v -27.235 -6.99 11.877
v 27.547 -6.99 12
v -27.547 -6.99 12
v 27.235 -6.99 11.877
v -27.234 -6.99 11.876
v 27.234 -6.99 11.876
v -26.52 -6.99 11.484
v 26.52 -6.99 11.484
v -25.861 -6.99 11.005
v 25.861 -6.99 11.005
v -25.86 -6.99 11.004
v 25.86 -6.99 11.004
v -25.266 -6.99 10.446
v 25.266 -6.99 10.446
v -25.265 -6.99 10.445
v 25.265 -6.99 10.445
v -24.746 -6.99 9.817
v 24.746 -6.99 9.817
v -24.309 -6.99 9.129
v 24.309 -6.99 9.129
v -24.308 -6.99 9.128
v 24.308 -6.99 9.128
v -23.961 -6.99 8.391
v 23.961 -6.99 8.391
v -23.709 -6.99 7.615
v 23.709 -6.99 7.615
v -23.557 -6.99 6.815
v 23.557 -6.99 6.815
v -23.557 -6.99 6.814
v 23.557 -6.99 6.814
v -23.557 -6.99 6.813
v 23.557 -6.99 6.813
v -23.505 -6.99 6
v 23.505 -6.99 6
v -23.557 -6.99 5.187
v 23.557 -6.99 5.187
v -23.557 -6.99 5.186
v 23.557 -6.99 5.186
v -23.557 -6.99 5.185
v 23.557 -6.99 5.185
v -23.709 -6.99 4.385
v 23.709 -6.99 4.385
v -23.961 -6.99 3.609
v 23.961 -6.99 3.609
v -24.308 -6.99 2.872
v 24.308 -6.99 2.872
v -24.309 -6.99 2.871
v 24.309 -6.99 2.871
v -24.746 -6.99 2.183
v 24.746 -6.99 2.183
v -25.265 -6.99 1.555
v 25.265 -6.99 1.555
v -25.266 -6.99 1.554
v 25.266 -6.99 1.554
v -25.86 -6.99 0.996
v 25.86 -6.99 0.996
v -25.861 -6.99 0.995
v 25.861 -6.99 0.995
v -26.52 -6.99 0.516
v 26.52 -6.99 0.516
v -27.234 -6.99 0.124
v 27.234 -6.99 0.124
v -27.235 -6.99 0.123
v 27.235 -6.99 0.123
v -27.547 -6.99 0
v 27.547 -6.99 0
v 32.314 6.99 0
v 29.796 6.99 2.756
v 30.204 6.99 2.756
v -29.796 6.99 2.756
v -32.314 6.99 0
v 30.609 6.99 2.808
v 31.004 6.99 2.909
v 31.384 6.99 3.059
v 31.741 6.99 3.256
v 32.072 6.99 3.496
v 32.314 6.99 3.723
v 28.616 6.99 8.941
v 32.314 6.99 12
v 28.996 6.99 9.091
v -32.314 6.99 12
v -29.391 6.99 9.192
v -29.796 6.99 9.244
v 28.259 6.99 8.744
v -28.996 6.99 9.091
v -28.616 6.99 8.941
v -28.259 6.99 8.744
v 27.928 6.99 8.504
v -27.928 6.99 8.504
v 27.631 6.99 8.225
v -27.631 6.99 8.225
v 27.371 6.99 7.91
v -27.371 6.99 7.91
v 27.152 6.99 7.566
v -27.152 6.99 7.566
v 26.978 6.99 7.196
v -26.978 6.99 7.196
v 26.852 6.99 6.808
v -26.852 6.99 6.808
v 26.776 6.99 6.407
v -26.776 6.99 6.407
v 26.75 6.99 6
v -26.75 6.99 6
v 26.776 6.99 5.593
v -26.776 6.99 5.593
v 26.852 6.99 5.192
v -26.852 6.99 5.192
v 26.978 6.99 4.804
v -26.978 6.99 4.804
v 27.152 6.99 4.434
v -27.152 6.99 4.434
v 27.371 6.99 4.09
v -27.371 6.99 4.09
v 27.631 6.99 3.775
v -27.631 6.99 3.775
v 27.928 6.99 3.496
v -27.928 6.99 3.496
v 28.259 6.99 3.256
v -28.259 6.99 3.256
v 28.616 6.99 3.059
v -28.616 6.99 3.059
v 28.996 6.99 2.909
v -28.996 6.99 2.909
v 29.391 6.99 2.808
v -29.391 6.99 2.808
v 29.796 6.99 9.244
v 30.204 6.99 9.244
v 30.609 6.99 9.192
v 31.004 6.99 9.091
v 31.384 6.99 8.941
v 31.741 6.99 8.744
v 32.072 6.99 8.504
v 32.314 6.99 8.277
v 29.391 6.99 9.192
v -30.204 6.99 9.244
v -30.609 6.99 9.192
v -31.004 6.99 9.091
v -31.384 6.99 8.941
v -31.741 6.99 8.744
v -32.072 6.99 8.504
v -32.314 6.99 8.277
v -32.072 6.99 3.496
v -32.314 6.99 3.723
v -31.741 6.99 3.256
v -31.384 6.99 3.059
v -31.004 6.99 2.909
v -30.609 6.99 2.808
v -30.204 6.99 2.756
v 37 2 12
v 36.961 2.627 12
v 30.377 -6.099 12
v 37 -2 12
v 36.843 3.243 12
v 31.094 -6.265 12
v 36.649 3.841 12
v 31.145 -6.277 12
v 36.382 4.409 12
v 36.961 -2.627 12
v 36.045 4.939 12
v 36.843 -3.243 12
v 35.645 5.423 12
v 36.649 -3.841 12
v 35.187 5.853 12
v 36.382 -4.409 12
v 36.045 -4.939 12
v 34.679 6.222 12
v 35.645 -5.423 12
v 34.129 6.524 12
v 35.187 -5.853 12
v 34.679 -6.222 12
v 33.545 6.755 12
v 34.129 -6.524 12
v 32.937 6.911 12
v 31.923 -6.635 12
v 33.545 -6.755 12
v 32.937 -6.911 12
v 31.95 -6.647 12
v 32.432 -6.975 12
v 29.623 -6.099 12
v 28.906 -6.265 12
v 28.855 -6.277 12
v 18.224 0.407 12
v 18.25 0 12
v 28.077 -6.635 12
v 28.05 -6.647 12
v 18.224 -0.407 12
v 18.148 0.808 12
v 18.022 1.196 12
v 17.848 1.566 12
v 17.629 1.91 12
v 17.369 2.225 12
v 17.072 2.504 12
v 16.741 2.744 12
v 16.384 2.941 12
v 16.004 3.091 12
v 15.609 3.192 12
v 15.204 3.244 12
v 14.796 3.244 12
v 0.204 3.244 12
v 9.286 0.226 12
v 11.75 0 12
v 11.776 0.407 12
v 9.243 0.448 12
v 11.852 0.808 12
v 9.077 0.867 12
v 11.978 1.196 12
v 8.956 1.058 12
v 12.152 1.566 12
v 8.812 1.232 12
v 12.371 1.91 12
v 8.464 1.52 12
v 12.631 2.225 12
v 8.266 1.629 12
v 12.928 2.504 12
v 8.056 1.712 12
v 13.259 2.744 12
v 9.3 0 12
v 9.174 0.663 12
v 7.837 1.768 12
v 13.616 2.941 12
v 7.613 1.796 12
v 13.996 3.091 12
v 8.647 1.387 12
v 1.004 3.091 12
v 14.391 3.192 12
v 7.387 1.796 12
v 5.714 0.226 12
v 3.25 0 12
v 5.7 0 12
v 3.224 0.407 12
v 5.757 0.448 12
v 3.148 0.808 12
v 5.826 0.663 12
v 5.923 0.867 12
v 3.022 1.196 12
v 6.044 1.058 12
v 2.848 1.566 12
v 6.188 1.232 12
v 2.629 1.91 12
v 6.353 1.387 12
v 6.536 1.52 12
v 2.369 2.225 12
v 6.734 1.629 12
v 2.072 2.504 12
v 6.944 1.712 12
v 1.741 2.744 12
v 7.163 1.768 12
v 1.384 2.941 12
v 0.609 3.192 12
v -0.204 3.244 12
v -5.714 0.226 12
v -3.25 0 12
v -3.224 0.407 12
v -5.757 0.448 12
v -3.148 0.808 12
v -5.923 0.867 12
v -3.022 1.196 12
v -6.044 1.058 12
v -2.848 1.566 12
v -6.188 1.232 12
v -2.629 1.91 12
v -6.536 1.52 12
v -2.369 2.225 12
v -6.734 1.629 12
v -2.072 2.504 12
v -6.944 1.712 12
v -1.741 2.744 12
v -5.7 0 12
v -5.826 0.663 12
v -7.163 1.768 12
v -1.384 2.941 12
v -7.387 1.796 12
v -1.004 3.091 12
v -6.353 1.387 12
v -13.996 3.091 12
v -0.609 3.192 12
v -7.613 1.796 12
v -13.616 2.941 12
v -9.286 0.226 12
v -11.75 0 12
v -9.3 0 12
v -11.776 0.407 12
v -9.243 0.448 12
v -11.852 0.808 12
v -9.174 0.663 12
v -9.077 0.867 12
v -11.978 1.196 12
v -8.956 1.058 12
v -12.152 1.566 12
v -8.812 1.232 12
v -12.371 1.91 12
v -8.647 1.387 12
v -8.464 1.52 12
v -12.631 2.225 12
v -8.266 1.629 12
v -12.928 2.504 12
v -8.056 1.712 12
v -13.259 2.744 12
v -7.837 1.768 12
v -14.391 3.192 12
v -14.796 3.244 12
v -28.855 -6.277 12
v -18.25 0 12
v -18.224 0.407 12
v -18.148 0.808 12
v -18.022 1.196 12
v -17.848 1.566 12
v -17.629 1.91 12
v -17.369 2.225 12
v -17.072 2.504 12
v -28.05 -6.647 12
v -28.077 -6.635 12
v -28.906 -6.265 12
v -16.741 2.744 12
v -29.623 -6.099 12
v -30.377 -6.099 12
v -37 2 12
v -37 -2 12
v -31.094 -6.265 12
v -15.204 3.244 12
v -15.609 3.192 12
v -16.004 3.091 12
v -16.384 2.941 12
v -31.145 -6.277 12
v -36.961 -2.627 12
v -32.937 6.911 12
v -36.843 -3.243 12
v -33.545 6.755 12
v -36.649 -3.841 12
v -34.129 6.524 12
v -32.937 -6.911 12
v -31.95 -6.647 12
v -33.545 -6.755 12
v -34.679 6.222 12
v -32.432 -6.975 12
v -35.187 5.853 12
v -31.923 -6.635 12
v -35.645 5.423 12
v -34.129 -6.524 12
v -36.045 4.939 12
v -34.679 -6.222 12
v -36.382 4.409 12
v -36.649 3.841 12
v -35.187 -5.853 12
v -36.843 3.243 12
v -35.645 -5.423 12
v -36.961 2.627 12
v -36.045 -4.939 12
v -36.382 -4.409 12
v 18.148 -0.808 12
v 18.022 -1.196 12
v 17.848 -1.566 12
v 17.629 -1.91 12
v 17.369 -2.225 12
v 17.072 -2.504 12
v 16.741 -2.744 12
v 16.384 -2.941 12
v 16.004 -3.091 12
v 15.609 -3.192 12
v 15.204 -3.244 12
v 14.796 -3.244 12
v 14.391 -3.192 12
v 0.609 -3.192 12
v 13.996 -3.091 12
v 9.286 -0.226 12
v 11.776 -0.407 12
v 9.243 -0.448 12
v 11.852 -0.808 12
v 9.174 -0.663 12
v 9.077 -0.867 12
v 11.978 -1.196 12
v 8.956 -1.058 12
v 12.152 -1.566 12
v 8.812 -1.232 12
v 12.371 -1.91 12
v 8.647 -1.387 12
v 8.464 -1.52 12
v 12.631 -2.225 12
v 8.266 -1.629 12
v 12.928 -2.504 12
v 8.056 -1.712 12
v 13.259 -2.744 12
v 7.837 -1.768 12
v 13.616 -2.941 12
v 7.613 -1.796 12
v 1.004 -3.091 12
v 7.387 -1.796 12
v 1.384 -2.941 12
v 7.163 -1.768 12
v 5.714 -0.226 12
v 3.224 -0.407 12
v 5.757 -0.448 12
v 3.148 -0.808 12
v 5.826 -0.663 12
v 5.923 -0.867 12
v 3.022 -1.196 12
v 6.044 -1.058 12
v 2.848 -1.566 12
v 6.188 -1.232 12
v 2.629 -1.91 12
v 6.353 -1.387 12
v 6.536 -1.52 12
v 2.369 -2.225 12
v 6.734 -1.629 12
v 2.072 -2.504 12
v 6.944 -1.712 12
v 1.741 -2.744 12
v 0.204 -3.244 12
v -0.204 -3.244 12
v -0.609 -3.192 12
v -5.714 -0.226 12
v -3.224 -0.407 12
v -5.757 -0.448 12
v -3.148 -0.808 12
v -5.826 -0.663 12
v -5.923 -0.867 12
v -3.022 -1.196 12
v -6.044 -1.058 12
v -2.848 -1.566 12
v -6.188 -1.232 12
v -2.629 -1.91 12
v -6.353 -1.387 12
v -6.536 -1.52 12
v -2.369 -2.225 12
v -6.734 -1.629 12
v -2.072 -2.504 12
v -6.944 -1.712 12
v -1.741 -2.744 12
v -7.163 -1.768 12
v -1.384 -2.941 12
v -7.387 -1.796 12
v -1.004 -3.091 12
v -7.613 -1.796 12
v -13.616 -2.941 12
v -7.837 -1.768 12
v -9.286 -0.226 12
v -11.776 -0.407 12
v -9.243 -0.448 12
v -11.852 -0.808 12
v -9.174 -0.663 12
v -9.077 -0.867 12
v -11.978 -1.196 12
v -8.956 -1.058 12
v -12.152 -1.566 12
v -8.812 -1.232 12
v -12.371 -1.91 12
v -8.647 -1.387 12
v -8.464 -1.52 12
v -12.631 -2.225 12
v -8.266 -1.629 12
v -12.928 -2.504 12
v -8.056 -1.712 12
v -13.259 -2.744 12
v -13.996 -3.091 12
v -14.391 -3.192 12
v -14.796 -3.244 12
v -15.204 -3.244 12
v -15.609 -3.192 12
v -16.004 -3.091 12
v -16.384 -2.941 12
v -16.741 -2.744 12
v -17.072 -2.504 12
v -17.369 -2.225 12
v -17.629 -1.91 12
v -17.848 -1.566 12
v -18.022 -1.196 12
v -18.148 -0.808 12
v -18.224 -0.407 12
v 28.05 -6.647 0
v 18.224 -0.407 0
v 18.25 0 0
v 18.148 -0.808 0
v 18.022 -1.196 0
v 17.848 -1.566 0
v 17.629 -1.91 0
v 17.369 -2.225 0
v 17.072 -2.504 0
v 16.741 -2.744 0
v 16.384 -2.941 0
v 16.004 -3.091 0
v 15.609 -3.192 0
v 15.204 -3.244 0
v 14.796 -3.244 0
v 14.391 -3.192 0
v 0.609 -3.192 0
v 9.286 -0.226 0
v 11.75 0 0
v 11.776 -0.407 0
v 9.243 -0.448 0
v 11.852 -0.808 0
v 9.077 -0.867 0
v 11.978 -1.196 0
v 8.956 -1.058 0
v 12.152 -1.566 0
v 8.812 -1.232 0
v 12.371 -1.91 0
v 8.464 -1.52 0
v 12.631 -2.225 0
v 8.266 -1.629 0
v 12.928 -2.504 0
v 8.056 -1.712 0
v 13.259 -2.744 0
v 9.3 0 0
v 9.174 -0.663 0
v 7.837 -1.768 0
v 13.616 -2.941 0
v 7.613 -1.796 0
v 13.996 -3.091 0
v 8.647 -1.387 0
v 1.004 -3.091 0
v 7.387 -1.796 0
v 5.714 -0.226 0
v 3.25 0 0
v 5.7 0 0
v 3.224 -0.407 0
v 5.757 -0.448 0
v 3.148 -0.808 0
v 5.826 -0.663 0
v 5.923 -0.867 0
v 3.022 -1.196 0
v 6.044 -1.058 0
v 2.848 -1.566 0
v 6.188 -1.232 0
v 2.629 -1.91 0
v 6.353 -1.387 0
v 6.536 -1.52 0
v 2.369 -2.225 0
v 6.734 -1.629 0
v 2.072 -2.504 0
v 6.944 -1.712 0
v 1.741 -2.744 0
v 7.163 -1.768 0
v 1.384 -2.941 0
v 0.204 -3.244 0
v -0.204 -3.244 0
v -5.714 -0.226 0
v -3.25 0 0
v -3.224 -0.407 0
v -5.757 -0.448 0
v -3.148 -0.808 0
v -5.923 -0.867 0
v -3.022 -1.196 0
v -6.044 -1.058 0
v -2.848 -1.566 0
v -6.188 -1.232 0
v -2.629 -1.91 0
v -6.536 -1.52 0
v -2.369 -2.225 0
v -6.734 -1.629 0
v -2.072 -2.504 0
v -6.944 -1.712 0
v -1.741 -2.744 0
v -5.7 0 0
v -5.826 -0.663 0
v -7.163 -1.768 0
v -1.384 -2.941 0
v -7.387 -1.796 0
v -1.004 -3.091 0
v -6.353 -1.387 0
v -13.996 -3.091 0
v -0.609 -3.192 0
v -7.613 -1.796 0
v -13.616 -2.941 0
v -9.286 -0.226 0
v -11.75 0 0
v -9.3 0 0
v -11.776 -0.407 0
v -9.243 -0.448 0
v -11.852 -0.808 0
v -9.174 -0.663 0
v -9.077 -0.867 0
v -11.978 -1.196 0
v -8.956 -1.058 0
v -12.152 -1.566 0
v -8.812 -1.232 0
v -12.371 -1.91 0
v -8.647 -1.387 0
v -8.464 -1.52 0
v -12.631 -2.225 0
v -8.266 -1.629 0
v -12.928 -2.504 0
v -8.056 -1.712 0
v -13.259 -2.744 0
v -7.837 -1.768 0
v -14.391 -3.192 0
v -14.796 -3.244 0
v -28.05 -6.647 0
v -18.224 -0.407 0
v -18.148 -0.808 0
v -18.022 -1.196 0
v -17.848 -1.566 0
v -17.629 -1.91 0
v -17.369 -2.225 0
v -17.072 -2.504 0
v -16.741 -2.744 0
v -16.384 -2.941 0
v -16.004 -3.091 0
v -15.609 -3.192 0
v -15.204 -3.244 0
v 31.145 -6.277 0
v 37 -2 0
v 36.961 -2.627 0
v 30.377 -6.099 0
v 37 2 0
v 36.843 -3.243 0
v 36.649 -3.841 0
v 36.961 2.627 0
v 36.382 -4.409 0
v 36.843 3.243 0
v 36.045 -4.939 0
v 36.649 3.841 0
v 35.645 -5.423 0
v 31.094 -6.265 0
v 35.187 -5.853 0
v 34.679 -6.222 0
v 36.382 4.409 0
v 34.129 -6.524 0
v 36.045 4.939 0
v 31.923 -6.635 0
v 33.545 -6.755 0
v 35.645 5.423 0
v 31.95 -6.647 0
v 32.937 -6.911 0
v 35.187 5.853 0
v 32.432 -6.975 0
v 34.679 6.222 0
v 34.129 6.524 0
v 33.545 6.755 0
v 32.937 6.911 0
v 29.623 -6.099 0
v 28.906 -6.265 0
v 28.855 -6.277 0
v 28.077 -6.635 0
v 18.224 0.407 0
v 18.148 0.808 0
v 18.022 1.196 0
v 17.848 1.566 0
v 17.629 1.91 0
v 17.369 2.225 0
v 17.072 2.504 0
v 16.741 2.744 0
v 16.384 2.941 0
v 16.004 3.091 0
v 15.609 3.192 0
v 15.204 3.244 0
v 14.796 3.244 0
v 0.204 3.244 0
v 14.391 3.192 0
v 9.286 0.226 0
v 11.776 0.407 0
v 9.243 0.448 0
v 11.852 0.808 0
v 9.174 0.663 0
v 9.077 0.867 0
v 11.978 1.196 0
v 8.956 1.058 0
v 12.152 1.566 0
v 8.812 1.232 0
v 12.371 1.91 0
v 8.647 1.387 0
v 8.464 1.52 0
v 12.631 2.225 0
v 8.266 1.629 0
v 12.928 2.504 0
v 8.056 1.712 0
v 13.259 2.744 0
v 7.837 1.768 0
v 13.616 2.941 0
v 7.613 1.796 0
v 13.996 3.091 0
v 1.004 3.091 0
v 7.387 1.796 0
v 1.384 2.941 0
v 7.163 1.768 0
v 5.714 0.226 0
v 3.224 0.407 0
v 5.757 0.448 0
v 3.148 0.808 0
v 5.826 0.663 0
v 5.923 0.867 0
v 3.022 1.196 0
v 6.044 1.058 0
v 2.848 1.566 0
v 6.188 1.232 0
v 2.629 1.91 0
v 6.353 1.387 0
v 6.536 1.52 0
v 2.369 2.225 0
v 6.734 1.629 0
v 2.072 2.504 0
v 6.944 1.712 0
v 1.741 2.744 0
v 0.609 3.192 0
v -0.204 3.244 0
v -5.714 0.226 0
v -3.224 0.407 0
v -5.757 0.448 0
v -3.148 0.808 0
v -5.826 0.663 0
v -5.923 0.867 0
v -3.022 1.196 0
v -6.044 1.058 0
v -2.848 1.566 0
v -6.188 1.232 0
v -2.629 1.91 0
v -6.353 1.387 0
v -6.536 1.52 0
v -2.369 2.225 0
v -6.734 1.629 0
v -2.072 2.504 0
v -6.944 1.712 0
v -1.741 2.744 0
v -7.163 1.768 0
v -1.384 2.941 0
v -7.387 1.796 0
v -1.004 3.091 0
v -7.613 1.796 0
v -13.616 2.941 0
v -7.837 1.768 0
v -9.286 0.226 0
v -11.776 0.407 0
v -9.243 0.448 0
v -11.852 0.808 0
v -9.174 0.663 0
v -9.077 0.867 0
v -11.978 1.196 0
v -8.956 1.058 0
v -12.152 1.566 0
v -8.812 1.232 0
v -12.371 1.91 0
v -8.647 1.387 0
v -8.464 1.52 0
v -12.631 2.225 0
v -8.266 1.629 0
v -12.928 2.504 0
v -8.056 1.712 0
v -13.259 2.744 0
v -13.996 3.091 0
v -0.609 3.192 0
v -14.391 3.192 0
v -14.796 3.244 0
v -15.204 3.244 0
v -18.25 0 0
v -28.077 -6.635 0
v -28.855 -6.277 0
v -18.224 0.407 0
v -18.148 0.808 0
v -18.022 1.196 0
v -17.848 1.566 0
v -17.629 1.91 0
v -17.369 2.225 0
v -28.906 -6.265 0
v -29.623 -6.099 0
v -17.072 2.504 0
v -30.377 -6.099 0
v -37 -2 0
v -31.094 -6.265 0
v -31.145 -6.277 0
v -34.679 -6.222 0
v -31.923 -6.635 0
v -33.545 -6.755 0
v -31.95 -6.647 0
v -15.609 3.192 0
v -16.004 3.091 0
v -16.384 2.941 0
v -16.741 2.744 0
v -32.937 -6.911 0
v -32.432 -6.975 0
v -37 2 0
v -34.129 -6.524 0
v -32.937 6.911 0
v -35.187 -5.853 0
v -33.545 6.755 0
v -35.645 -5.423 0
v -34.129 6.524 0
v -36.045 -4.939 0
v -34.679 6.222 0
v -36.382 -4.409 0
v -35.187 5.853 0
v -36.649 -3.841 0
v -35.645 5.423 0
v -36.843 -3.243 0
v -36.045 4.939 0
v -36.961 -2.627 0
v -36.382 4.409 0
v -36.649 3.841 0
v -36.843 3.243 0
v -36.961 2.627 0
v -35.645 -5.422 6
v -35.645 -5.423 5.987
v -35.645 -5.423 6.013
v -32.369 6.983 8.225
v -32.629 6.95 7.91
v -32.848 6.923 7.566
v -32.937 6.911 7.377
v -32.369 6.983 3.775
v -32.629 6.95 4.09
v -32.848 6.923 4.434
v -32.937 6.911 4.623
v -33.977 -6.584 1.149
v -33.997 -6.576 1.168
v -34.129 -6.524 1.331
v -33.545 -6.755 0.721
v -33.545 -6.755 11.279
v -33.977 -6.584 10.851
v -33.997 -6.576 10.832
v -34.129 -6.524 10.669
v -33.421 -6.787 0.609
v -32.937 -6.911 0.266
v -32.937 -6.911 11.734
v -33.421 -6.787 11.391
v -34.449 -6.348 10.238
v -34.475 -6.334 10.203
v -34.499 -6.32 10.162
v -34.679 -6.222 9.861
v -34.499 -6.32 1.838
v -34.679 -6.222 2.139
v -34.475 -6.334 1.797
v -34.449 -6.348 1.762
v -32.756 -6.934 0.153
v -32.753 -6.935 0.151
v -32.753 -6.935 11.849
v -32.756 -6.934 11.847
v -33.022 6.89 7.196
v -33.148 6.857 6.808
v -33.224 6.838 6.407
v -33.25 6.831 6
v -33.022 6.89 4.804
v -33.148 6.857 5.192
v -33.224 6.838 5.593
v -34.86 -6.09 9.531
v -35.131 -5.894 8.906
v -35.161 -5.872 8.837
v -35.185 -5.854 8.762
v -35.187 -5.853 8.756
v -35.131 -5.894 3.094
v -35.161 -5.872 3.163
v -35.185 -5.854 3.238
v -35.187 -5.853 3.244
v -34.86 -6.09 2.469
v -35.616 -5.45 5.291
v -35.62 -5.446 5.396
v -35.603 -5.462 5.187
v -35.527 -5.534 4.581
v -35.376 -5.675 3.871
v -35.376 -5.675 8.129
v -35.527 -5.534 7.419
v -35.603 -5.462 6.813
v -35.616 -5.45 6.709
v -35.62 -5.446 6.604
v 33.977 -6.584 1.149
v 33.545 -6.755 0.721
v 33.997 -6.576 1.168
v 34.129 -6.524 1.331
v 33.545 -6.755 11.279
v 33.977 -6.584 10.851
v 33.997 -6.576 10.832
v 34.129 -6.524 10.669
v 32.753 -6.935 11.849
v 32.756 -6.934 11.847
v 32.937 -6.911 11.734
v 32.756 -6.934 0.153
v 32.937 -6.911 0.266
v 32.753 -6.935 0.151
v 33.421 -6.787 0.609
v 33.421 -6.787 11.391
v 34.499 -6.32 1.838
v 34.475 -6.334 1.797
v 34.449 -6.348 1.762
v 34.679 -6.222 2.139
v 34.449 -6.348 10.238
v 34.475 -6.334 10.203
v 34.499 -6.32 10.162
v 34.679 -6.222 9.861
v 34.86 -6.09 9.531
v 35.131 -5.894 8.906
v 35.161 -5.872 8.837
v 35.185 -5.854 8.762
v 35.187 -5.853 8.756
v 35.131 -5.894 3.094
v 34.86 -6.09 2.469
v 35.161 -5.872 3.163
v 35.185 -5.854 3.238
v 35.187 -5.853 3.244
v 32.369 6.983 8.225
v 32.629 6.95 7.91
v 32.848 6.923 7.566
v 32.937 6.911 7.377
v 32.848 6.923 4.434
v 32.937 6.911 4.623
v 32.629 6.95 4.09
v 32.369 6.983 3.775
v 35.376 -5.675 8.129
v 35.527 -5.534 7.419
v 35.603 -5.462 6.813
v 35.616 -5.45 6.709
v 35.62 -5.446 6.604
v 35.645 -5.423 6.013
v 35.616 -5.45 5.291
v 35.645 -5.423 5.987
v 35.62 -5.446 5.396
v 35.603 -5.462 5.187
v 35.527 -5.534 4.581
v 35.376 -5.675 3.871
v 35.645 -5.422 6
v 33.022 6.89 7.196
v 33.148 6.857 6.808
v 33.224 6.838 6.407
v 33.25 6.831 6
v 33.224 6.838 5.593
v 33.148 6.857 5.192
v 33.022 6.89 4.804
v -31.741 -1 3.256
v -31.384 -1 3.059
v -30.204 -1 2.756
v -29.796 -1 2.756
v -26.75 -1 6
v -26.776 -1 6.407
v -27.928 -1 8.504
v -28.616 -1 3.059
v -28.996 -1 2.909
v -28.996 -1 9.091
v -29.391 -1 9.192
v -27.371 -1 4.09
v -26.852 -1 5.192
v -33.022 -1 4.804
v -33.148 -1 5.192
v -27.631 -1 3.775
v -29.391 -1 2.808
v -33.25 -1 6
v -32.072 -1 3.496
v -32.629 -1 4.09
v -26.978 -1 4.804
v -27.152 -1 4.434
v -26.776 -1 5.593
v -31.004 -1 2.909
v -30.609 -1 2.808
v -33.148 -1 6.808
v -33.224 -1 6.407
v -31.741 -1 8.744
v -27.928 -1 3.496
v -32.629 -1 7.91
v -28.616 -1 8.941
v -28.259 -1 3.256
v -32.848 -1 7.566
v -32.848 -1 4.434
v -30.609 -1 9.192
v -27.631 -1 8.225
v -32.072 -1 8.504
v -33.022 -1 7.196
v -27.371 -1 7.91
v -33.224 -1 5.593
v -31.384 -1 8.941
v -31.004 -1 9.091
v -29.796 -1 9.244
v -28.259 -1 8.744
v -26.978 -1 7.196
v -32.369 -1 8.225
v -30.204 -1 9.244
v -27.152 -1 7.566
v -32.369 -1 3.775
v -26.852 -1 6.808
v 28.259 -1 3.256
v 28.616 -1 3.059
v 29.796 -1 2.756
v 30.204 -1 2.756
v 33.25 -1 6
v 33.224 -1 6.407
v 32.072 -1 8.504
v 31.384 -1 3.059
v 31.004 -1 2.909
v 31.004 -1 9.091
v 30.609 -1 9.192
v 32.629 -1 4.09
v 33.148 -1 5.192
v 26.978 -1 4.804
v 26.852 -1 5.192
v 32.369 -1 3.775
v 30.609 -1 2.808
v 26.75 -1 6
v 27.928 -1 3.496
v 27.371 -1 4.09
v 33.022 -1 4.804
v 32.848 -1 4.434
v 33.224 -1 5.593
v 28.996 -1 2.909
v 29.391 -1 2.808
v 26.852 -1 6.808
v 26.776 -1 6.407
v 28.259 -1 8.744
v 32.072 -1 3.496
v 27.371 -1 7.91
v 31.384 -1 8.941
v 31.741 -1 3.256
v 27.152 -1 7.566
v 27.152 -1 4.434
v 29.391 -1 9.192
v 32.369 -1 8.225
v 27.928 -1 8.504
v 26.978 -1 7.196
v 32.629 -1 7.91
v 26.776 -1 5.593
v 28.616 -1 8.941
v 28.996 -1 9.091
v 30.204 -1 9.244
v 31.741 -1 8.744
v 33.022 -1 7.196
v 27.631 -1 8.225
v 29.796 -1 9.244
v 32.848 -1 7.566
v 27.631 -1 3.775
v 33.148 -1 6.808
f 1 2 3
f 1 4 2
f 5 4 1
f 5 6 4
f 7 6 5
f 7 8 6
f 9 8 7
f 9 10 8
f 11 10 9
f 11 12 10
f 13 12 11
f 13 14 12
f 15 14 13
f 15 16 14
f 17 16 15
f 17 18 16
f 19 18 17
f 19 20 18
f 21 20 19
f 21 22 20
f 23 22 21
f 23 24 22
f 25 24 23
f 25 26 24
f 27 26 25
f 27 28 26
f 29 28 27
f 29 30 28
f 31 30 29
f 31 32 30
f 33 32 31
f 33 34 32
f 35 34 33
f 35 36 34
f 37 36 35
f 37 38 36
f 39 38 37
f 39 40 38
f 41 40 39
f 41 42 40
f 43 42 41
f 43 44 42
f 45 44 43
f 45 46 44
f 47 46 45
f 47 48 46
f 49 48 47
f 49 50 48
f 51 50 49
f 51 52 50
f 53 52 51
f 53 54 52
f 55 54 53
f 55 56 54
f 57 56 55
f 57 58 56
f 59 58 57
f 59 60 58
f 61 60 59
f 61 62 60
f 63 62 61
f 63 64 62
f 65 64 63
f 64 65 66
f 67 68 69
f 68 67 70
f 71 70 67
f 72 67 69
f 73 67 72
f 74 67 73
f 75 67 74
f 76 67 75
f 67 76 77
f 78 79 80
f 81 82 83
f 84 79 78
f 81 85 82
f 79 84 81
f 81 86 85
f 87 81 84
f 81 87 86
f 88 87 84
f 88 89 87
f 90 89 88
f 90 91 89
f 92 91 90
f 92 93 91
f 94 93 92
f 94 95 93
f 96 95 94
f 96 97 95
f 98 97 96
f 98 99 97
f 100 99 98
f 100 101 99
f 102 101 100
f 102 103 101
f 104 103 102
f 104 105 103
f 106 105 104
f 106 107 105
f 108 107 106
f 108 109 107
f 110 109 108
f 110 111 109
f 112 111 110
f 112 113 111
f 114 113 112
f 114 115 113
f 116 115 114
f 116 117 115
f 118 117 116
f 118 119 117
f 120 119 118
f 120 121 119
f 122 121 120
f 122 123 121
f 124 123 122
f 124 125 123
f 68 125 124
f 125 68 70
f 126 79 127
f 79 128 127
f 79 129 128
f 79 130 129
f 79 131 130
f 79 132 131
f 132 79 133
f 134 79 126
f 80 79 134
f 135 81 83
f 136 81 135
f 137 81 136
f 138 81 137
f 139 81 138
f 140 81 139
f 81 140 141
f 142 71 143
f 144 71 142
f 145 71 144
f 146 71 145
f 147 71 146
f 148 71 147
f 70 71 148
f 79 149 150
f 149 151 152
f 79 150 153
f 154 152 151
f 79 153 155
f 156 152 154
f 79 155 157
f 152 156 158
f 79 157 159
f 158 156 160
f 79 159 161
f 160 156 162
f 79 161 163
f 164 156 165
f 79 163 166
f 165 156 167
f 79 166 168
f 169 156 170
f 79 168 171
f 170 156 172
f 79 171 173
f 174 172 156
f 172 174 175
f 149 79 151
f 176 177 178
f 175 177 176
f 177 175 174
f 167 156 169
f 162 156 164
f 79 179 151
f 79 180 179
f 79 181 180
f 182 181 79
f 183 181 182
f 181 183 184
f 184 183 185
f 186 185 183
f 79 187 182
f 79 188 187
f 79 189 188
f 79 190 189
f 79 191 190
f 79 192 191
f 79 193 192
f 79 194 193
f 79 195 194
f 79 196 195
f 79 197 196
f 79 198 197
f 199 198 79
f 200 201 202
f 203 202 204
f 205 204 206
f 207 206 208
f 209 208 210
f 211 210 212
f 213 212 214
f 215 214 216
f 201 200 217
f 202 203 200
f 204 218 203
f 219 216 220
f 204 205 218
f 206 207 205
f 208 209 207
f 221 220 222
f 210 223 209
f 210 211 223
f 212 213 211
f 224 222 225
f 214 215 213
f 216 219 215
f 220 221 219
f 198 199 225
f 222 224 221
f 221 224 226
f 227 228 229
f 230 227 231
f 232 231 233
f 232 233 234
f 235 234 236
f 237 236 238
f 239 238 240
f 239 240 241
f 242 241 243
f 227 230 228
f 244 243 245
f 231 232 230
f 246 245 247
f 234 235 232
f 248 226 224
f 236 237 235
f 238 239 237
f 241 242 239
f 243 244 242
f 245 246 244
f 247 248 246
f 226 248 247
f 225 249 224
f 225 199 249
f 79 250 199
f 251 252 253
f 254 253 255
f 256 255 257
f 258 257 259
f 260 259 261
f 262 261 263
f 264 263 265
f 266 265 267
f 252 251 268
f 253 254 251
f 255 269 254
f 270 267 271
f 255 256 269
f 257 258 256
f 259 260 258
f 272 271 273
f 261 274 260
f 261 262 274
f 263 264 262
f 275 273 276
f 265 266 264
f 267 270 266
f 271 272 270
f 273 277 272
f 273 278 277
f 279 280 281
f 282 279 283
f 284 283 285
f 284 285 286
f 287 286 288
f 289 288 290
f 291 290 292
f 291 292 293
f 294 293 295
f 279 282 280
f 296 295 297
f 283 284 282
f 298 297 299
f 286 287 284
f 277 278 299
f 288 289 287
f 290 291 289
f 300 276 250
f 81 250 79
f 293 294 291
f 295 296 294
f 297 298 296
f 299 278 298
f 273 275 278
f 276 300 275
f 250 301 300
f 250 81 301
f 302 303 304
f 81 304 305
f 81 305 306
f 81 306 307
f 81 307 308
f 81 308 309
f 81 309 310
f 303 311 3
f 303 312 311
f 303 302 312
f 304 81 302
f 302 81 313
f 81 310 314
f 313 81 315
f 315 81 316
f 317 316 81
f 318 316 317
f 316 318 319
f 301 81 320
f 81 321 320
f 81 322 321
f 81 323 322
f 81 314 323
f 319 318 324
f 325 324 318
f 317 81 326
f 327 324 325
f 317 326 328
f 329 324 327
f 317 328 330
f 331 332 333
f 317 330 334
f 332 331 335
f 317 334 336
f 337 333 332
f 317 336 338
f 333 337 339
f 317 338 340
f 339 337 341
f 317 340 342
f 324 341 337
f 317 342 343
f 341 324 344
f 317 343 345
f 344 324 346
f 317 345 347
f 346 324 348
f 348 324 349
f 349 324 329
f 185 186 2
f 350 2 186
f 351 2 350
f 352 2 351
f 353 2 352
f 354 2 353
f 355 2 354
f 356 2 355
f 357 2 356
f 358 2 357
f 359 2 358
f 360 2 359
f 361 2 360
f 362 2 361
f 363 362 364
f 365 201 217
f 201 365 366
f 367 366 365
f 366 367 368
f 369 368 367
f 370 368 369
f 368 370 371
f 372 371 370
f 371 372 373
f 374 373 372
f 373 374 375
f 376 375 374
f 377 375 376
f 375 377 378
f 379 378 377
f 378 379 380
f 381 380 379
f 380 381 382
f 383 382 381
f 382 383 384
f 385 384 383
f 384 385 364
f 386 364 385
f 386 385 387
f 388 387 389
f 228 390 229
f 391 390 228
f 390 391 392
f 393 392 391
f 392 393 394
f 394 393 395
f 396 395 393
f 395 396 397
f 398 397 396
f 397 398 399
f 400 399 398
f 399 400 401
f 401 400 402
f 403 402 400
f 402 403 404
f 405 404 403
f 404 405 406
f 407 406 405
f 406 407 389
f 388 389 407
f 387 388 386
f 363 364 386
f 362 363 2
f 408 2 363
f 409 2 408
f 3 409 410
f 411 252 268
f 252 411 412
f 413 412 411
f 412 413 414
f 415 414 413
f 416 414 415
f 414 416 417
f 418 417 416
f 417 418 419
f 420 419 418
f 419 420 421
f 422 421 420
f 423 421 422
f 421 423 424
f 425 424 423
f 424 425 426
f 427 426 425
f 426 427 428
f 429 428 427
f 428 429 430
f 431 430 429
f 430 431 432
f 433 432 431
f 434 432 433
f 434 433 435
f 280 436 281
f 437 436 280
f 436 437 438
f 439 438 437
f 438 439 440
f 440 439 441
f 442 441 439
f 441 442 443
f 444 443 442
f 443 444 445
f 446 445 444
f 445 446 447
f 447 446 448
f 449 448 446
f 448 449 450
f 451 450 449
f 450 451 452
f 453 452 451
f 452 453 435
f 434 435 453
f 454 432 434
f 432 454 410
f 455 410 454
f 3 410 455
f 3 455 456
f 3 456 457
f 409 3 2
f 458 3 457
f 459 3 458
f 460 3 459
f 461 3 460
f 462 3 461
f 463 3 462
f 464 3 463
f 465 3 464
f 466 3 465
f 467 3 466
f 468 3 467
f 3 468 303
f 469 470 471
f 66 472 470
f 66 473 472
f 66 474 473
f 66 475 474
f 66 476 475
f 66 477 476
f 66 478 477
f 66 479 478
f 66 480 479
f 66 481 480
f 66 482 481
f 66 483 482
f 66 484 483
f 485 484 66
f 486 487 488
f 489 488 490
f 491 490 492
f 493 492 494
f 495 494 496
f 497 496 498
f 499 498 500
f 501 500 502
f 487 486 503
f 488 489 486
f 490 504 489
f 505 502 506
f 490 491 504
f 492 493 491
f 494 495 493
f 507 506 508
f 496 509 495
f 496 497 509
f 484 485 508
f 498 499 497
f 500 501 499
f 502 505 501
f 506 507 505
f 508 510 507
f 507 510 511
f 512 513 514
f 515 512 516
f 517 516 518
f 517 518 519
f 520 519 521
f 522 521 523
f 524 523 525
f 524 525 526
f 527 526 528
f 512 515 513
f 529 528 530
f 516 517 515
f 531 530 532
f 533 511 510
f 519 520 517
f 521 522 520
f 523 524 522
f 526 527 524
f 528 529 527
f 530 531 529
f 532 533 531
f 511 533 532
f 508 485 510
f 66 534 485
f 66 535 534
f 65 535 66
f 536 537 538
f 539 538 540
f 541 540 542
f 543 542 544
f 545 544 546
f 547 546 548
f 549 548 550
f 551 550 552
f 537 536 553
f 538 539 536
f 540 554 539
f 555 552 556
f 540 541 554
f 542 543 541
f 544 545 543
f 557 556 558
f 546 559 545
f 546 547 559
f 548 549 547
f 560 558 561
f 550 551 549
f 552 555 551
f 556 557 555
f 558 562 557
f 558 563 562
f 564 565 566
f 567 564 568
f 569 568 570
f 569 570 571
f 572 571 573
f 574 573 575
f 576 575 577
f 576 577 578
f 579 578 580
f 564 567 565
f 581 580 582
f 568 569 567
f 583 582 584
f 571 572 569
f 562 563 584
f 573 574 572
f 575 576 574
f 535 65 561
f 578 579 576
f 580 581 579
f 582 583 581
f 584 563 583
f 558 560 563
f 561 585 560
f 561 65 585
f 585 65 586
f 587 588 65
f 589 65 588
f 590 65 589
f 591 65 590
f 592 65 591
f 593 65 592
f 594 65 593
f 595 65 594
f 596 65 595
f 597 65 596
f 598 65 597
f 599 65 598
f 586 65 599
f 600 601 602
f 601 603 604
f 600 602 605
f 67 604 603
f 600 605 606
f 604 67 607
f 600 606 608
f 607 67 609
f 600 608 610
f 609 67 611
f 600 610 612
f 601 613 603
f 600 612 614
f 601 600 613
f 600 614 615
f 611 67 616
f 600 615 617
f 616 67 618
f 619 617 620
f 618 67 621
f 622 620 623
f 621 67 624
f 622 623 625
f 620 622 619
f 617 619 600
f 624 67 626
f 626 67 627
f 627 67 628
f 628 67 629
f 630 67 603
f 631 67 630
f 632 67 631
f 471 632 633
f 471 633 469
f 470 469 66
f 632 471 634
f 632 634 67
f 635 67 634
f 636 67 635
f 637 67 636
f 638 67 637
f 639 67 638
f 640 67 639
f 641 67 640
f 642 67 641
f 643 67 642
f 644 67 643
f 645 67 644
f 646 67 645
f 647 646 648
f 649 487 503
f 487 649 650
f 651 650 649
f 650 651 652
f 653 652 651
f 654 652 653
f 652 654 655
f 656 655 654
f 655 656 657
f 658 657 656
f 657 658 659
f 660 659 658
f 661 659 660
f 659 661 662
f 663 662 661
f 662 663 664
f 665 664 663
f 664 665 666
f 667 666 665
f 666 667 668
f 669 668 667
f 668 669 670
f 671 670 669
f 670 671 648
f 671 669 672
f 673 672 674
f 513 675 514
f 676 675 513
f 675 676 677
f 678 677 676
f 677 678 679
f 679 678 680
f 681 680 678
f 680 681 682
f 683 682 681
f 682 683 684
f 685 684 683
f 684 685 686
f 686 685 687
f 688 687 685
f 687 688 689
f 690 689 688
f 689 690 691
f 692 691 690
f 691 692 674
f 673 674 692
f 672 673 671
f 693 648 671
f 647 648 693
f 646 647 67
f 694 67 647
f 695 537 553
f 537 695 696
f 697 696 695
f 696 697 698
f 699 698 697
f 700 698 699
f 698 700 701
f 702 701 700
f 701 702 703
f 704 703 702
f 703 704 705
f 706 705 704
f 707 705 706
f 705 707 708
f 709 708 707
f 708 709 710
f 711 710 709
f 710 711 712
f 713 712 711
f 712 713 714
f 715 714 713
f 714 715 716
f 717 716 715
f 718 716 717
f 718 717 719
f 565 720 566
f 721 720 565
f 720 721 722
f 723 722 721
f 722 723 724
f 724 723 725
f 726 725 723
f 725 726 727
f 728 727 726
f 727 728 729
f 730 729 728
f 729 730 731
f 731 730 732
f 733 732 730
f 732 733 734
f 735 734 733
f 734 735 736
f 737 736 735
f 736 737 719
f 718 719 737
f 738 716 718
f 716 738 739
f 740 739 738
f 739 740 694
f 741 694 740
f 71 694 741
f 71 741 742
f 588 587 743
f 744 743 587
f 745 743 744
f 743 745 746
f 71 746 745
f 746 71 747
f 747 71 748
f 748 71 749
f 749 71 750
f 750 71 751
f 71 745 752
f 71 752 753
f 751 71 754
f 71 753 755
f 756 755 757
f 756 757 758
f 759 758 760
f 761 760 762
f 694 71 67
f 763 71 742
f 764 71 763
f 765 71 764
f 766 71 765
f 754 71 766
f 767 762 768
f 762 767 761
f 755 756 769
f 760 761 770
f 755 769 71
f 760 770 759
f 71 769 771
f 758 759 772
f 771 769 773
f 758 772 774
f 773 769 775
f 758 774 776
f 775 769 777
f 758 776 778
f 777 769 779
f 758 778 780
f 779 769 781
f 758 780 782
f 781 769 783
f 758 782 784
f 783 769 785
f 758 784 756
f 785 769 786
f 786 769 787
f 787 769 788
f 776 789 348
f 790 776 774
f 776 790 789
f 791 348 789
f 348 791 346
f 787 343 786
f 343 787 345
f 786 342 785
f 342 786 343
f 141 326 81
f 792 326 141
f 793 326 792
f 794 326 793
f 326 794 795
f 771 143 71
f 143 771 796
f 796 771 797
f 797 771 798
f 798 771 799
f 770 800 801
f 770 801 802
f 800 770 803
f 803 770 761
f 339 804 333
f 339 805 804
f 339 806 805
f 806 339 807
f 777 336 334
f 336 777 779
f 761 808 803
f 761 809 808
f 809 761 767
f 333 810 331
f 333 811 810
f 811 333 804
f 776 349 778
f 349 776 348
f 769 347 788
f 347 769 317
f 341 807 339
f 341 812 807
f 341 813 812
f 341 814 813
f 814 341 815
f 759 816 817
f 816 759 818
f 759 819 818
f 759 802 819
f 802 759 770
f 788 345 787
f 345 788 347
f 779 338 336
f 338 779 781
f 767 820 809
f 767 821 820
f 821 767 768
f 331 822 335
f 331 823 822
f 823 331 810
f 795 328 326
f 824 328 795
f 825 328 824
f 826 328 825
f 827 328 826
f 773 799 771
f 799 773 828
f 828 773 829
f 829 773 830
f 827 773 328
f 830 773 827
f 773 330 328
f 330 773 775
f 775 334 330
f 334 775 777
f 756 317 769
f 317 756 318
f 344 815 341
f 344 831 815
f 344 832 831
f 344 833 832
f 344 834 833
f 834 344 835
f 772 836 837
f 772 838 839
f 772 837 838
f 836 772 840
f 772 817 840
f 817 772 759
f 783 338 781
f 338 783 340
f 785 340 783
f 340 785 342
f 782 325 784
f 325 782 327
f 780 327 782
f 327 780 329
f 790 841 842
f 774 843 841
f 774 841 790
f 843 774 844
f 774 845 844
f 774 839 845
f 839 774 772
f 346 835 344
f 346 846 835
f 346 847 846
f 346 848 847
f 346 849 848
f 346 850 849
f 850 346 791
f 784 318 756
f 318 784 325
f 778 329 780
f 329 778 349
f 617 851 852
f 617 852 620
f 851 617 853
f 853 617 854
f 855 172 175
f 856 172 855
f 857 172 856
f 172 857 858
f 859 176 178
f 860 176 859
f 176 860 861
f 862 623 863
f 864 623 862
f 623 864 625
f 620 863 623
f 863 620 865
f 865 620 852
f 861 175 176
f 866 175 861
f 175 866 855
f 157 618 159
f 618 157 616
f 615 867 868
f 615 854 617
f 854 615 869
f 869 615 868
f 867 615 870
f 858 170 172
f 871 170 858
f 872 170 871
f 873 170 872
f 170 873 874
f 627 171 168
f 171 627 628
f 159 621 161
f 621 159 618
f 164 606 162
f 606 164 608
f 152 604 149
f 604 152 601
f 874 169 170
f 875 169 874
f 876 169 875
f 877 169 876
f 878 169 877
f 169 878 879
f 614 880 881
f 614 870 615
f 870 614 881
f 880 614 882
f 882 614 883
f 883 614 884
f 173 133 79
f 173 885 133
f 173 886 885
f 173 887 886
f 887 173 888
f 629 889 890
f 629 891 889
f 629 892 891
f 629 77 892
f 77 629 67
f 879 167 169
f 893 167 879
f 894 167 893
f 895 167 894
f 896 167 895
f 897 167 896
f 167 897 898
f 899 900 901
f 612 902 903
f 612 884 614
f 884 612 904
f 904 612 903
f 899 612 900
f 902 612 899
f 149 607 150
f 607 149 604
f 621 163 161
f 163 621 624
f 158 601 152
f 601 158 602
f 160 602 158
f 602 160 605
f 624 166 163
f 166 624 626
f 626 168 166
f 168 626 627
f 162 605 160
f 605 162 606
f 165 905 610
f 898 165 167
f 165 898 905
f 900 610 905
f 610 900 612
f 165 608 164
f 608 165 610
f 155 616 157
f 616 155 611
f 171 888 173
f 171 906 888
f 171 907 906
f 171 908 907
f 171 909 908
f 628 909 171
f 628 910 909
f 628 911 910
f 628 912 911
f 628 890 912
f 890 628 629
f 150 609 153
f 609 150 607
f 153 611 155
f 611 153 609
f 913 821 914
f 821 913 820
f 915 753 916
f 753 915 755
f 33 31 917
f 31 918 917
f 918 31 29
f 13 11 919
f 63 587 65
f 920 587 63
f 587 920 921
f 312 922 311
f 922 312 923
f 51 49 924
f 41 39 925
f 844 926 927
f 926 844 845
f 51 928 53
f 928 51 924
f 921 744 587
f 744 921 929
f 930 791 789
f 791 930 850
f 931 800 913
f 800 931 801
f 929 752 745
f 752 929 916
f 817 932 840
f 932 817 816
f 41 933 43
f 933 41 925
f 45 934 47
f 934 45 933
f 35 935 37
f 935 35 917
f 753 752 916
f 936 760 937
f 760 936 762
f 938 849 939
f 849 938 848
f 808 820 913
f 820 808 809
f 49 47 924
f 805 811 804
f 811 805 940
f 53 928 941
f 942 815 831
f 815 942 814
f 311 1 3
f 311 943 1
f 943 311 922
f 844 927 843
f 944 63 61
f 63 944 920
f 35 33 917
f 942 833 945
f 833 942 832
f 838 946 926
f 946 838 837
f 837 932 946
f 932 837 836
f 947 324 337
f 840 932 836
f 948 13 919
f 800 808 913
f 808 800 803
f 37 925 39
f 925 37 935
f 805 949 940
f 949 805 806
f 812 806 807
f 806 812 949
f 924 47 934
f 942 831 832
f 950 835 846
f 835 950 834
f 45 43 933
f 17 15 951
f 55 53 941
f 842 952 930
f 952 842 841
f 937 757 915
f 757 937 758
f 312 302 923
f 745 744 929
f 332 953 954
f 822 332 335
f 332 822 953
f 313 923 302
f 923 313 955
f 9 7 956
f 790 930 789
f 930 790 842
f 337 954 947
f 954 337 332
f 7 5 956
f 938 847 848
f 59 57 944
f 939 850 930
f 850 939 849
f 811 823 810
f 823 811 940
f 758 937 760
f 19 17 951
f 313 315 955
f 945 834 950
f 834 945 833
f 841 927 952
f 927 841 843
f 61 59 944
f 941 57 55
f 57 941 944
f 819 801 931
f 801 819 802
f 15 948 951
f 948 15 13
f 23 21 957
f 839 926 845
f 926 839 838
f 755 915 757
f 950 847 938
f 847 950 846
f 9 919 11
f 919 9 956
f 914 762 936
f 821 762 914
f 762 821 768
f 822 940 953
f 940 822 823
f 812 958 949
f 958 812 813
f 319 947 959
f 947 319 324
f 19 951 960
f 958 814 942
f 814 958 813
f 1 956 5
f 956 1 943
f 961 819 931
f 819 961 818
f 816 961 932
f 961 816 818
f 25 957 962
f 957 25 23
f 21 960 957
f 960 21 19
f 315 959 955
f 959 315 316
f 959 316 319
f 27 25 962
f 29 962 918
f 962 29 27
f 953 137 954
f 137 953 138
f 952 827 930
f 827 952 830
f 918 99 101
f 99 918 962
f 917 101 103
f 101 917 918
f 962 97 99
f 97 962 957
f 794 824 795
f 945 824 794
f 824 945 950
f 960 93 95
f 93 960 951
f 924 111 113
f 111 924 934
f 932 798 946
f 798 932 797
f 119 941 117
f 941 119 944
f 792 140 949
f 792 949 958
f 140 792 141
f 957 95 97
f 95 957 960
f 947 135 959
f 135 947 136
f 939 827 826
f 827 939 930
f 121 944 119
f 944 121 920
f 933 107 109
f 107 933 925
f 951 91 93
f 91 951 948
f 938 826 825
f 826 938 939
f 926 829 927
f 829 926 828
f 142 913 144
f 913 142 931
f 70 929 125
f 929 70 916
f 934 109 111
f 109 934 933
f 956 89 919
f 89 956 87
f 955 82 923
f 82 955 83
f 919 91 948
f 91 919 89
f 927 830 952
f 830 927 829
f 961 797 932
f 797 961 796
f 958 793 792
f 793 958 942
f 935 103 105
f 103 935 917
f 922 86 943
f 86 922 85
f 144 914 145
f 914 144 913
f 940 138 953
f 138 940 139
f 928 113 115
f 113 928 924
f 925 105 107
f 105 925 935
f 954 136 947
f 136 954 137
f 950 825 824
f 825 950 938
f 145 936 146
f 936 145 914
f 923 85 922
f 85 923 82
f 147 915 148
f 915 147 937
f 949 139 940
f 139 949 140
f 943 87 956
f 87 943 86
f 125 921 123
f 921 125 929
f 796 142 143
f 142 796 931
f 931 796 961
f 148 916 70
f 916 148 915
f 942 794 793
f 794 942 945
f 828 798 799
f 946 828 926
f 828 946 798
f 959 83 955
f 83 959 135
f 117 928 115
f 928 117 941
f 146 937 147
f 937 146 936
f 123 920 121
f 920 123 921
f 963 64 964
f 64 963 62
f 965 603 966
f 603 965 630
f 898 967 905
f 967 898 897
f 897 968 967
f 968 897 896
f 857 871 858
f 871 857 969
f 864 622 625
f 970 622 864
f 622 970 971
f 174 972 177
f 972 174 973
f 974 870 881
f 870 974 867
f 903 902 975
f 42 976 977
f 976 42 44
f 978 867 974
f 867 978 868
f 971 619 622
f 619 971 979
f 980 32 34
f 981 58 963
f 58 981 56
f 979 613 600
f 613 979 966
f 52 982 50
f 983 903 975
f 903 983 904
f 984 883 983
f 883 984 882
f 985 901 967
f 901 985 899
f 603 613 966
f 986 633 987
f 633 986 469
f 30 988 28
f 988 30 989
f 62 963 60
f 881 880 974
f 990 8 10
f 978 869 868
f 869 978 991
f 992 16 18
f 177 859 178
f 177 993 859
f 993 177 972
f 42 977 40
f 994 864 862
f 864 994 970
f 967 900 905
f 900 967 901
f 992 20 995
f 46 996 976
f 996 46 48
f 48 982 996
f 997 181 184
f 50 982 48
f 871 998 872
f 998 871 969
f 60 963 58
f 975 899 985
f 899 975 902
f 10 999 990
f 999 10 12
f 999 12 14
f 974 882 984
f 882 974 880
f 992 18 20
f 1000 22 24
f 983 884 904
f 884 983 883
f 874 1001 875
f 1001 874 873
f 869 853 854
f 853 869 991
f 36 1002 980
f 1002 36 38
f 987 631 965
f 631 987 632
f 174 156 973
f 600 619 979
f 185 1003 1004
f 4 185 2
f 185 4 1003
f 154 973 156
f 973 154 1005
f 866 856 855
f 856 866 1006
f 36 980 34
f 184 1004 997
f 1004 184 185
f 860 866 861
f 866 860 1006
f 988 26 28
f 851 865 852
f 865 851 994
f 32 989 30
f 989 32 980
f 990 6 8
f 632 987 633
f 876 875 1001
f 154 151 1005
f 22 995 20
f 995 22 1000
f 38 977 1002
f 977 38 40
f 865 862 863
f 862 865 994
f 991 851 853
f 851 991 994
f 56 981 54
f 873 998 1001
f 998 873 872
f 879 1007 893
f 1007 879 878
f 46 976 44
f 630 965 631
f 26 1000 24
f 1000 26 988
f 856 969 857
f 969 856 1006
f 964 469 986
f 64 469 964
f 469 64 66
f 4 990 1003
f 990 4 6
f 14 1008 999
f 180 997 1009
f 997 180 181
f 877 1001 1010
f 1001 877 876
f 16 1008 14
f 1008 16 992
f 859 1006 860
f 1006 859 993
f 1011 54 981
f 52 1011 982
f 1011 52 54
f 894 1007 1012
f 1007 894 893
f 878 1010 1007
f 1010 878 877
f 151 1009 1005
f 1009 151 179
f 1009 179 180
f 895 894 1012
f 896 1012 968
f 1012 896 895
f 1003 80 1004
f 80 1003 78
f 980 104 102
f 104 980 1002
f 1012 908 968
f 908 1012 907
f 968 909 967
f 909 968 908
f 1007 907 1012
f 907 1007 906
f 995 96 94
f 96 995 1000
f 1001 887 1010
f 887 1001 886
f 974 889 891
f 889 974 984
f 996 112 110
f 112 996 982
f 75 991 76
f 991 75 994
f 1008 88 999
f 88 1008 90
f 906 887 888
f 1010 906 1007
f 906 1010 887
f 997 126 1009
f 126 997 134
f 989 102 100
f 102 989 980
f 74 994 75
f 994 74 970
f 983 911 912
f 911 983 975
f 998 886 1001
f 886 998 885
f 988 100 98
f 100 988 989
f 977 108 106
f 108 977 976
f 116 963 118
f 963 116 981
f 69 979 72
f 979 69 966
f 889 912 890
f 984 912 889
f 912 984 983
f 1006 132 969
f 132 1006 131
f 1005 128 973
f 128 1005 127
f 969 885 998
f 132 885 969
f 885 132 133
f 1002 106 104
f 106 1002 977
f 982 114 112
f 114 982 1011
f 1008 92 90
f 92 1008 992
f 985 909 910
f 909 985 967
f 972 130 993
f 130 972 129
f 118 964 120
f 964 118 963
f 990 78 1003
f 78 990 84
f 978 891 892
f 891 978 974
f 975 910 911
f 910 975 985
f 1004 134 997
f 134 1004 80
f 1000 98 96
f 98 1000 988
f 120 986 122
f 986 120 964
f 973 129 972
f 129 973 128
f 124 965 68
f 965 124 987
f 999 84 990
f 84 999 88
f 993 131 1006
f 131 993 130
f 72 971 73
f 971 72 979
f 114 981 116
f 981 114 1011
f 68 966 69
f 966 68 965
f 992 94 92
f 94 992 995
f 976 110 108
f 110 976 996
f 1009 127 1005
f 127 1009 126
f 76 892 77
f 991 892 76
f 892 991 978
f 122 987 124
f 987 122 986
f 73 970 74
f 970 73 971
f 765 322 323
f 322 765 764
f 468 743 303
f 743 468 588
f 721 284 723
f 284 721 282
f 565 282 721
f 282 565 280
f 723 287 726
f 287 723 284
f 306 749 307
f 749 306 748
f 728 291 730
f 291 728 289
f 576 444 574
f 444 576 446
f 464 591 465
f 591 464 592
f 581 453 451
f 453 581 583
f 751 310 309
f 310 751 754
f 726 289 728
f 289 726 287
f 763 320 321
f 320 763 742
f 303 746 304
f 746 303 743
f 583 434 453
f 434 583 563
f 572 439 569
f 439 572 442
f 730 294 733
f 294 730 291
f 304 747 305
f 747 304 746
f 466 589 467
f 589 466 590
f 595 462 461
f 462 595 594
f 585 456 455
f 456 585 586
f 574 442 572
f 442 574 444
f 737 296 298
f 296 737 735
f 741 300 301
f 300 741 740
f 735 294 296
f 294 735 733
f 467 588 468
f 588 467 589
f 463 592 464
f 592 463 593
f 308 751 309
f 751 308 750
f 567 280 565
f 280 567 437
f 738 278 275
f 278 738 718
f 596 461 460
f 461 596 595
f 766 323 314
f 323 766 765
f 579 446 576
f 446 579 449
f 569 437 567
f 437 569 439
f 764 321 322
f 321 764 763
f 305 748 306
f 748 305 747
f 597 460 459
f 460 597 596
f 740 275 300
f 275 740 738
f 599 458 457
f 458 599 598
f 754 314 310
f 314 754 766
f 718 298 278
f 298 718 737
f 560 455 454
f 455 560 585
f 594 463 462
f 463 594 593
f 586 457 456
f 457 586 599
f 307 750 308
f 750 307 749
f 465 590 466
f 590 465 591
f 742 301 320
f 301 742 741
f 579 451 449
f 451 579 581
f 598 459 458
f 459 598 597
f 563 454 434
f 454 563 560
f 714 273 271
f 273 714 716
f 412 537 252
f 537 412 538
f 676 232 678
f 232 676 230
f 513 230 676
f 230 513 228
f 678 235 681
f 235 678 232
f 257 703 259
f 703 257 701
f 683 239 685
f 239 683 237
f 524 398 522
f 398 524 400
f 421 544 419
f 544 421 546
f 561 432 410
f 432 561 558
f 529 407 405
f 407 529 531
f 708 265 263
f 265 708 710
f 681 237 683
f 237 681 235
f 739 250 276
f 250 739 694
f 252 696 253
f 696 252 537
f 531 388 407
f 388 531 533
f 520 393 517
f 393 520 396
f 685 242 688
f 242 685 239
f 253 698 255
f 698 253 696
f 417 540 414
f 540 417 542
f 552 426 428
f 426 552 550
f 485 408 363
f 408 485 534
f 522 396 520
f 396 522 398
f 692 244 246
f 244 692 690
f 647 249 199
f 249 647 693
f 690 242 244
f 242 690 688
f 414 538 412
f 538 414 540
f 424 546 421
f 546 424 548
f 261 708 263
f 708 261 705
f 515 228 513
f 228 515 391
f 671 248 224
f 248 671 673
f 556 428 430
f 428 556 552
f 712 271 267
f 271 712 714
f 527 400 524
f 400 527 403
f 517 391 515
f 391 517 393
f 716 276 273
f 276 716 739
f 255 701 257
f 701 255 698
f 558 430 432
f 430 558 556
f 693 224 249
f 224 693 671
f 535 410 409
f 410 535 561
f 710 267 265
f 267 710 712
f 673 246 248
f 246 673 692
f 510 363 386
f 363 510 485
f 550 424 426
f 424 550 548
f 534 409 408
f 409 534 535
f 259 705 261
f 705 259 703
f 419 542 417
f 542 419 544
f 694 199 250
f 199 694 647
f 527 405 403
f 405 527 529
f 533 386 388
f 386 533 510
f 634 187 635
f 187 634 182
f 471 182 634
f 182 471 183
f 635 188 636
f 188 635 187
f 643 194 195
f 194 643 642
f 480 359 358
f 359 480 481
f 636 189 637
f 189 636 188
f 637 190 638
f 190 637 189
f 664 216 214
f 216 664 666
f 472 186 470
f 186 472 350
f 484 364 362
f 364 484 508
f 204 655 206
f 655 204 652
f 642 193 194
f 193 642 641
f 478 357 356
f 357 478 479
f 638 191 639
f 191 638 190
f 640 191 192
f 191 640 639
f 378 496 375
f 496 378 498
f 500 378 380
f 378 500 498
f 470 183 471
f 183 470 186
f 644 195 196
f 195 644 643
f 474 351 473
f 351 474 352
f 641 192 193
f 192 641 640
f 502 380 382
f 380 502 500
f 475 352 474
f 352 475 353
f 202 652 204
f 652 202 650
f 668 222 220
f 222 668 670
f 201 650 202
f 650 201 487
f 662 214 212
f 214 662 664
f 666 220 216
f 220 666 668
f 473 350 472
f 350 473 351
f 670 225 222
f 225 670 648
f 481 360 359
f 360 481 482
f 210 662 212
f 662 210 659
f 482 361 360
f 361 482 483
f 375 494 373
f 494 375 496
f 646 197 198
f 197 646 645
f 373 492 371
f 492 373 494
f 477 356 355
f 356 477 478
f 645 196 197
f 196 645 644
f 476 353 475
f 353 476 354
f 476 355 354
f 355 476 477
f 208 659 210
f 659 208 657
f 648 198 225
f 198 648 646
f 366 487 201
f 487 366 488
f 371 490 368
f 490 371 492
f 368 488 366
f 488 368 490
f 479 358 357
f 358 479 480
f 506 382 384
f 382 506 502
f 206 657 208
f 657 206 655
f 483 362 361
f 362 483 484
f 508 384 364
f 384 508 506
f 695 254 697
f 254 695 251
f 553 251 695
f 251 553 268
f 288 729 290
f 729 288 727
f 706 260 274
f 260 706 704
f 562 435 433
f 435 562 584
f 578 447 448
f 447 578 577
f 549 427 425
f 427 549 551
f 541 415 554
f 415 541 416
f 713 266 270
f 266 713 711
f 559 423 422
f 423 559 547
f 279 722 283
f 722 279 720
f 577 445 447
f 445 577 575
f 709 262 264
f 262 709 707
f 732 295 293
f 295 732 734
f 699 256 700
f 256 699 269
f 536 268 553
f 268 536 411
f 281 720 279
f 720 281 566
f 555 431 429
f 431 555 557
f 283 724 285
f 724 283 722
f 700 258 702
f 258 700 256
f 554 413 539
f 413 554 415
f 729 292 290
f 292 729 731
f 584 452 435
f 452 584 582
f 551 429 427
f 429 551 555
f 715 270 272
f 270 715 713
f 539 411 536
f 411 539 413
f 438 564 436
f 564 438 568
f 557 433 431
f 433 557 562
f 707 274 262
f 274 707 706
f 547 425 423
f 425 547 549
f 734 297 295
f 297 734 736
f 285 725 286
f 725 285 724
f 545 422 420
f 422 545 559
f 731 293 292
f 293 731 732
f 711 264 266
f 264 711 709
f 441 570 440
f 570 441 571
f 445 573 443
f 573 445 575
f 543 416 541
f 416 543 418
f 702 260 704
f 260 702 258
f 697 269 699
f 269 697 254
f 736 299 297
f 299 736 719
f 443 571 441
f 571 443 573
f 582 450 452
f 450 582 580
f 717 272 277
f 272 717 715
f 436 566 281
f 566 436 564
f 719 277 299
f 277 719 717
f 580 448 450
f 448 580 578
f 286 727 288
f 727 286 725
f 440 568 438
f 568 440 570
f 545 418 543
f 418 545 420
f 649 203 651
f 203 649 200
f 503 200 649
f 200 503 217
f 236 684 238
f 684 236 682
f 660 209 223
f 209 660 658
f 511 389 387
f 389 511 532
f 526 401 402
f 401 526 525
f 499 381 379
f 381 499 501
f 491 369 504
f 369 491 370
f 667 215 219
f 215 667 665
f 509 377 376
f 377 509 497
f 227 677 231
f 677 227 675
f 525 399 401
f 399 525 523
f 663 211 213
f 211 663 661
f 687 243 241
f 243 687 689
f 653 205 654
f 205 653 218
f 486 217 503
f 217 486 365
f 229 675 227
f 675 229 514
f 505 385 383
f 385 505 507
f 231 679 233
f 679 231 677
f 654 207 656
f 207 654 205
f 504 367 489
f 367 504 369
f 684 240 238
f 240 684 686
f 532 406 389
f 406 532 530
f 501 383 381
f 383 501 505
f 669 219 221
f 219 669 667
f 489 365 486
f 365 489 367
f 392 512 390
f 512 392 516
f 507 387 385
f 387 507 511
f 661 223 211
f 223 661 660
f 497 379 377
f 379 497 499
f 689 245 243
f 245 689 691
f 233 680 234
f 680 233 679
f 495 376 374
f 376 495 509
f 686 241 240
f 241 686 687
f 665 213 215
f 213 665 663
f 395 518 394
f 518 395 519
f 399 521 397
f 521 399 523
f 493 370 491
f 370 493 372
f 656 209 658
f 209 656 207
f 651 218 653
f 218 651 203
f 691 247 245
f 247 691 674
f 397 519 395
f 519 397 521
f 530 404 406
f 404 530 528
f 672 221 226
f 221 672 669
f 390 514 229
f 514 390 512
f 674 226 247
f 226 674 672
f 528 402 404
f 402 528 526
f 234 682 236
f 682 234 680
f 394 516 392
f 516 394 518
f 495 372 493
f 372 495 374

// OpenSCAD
$fn = 50;


difference() {
	union() {
		hull() {
			translate(v = [-17.0000000000, 2.0000000000, 0]) {
				cylinder(h = 12, r = 5);
			}
			translate(v = [17.0000000000, 2.0000000000, 0]) {
				cylinder(h = 12, r = 5);
			}
			translate(v = [-17.0000000000, -2.0000000000, 0]) {
				cylinder(h = 12, r = 5);
			}
			translate(v = [17.0000000000, -2.0000000000, 0]) {
				cylinder(h = 12, r = 5);
			}
		}
		translate(v = [-22.5000000000, 0.0000000000, 0]) {
			hull() {
				translate(v = [-9.5000000000, 2.0000000000, 0]) {
					cylinder(h = 12, r = 5);
				}
				translate(v = [9.5000000000, 2.0000000000, 0]) {
					cylinder(h = 12, r = 5);
				}
				translate(v = [-9.5000000000, -2.0000000000, 0]) {
					cylinder(h = 12, r = 5);
				}
				translate(v = [9.5000000000, -2.0000000000, 0]) {
					cylinder(h = 12, r = 5);
				}
			}
		}
		translate(v = [-22.5000000000, 0.0000000000, 0]) {
			hull() {
				translate(v = [-9.5000000000, 2.0000000000, 0]) {
					cylinder(h = 12, r = 5);
				}
				translate(v = [9.5000000000, 2.0000000000, 0]) {
					cylinder(h = 12, r = 5);
				}
				translate(v = [-9.5000000000, -2.0000000000, 0]) {
					cylinder(h = 12, r = 5);
				}
				translate(v = [9.5000000000, -2.0000000000, 0]) {
					cylinder(h = 12, r = 5);
				}
			}
		}
		translate(v = [22.5000000000, 0.0000000000, 0]) {
			hull() {
				translate(v = [-9.5000000000, 2.0000000000, 0]) {
					cylinder(h = 12, r = 5);
				}
				translate(v = [9.5000000000, 2.0000000000, 0]) {
					cylinder(h = 12, r = 5);
				}
				translate(v = [-9.5000000000, -2.0000000000, 0]) {
					cylinder(h = 12, r = 5);
				}
				translate(v = [9.5000000000, -2.0000000000, 0]) {
					cylinder(h = 12, r = 5);
				}
			}
		}
		translate(v = [22.5000000000, 0.0000000000, 0]) {
			hull() {
				translate(v = [-9.5000000000, 2.0000000000, 0]) {
					cylinder(h = 12, r = 5);
				}
				translate(v = [9.5000000000, 2.0000000000, 0]) {
					cylinder(h = 12, r = 5);
				}
				translate(v = [-9.5000000000, -2.0000000000, 0]) {
					cylinder(h = 12, r = 5);
				}
				translate(v = [9.5000000000, -2.0000000000, 0]) {
					cylinder(h = 12, r = 5);
				}
			}
		}
	}
	union() {
		translate(v = [-30.0000000000, -7.0000000000, 6.0000000000]) {
			rotate(a = [90, 0, 0]) {
				difference() {
					union() {
						#translate(v = [0, 0, -14.0000000000]) {
							cylinder(h = 14, r = 2.2500000000);
						}
						#translate(v = [0, 0, -6]) {
							cylinder(h = 6, r1 = 3.2500000000, r2 = 6.5000000000);
						}
						#translate(v = [0, 0, -14.0000000000]) {
							cylinder(h = 14, r = 3.2500000000);
						}
						#translate(v = [0, 0, -14.0000000000]) {
							cylinder(h = 14, r = 2.2500000000);
						}
					}
					union();
				}
			}
		}
		translate(v = [30.0000000000, -7.0000000000, 6.0000000000]) {
			rotate(a = [90, 0, 0]) {
				difference() {
					union() {
						#translate(v = [0, 0, -14.0000000000]) {
							cylinder(h = 14, r = 2.2500000000);
						}
						#translate(v = [0, 0, -6]) {
							cylinder(h = 6, r1 = 3.2500000000, r2 = 6.5000000000);
						}
						#translate(v = [0, 0, -14.0000000000]) {
							cylinder(h = 14, r = 3.2500000000);
						}
						#translate(v = [0, 0, -14.0000000000]) {
							cylinder(h = 14, r = 2.2500000000);
						}
					}
					union();
				}
			}
		}
		translate(v = [-15.0000000000, 0.0000000000, 0]) {
			translate(v = [0, 0, -100]) {
				cylinder(h = 200, r = 3.2500000000);
			}
		}
		translate(v = [0, 0, -100]) {
			cylinder(h = 200, r = 3.2500000000);
		}
		translate(v = [15.0000000000, 0.0000000000, 0]) {
			translate(v = [0, 0, -100]) {
				cylinder(h = 200, r = 3.2500000000);
			}
		}
		translate(v = [-15.0000000000, 0.0000000000, 0]) {
			translate(v = [0, 0, -100]) {
				cylinder(h = 200, r = 1.8000000000);
			}
		}
		translate(v = [-7.5000000000, 0.0000000000, 0]) {
			translate(v = [0, 0, -100]) {
				cylinder(h = 200, r = 1.8000000000);
			}
		}
		translate(v = [0, 0, -100]) {
			cylinder(h = 200, r = 1.8000000000);
		}
		translate(v = [7.5000000000, 0.0000000000, 0]) {
			translate(v = [0, 0, -100]) {
				cylinder(h = 200, r = 1.8000000000);
			}
		}
		translate(v = [15.0000000000, 0.0000000000, 0]) {
			translate(v = [0, 0, -100]) {
				cylinder(h = 200, r = 1.8000000000);
			}
		}
	}
}
